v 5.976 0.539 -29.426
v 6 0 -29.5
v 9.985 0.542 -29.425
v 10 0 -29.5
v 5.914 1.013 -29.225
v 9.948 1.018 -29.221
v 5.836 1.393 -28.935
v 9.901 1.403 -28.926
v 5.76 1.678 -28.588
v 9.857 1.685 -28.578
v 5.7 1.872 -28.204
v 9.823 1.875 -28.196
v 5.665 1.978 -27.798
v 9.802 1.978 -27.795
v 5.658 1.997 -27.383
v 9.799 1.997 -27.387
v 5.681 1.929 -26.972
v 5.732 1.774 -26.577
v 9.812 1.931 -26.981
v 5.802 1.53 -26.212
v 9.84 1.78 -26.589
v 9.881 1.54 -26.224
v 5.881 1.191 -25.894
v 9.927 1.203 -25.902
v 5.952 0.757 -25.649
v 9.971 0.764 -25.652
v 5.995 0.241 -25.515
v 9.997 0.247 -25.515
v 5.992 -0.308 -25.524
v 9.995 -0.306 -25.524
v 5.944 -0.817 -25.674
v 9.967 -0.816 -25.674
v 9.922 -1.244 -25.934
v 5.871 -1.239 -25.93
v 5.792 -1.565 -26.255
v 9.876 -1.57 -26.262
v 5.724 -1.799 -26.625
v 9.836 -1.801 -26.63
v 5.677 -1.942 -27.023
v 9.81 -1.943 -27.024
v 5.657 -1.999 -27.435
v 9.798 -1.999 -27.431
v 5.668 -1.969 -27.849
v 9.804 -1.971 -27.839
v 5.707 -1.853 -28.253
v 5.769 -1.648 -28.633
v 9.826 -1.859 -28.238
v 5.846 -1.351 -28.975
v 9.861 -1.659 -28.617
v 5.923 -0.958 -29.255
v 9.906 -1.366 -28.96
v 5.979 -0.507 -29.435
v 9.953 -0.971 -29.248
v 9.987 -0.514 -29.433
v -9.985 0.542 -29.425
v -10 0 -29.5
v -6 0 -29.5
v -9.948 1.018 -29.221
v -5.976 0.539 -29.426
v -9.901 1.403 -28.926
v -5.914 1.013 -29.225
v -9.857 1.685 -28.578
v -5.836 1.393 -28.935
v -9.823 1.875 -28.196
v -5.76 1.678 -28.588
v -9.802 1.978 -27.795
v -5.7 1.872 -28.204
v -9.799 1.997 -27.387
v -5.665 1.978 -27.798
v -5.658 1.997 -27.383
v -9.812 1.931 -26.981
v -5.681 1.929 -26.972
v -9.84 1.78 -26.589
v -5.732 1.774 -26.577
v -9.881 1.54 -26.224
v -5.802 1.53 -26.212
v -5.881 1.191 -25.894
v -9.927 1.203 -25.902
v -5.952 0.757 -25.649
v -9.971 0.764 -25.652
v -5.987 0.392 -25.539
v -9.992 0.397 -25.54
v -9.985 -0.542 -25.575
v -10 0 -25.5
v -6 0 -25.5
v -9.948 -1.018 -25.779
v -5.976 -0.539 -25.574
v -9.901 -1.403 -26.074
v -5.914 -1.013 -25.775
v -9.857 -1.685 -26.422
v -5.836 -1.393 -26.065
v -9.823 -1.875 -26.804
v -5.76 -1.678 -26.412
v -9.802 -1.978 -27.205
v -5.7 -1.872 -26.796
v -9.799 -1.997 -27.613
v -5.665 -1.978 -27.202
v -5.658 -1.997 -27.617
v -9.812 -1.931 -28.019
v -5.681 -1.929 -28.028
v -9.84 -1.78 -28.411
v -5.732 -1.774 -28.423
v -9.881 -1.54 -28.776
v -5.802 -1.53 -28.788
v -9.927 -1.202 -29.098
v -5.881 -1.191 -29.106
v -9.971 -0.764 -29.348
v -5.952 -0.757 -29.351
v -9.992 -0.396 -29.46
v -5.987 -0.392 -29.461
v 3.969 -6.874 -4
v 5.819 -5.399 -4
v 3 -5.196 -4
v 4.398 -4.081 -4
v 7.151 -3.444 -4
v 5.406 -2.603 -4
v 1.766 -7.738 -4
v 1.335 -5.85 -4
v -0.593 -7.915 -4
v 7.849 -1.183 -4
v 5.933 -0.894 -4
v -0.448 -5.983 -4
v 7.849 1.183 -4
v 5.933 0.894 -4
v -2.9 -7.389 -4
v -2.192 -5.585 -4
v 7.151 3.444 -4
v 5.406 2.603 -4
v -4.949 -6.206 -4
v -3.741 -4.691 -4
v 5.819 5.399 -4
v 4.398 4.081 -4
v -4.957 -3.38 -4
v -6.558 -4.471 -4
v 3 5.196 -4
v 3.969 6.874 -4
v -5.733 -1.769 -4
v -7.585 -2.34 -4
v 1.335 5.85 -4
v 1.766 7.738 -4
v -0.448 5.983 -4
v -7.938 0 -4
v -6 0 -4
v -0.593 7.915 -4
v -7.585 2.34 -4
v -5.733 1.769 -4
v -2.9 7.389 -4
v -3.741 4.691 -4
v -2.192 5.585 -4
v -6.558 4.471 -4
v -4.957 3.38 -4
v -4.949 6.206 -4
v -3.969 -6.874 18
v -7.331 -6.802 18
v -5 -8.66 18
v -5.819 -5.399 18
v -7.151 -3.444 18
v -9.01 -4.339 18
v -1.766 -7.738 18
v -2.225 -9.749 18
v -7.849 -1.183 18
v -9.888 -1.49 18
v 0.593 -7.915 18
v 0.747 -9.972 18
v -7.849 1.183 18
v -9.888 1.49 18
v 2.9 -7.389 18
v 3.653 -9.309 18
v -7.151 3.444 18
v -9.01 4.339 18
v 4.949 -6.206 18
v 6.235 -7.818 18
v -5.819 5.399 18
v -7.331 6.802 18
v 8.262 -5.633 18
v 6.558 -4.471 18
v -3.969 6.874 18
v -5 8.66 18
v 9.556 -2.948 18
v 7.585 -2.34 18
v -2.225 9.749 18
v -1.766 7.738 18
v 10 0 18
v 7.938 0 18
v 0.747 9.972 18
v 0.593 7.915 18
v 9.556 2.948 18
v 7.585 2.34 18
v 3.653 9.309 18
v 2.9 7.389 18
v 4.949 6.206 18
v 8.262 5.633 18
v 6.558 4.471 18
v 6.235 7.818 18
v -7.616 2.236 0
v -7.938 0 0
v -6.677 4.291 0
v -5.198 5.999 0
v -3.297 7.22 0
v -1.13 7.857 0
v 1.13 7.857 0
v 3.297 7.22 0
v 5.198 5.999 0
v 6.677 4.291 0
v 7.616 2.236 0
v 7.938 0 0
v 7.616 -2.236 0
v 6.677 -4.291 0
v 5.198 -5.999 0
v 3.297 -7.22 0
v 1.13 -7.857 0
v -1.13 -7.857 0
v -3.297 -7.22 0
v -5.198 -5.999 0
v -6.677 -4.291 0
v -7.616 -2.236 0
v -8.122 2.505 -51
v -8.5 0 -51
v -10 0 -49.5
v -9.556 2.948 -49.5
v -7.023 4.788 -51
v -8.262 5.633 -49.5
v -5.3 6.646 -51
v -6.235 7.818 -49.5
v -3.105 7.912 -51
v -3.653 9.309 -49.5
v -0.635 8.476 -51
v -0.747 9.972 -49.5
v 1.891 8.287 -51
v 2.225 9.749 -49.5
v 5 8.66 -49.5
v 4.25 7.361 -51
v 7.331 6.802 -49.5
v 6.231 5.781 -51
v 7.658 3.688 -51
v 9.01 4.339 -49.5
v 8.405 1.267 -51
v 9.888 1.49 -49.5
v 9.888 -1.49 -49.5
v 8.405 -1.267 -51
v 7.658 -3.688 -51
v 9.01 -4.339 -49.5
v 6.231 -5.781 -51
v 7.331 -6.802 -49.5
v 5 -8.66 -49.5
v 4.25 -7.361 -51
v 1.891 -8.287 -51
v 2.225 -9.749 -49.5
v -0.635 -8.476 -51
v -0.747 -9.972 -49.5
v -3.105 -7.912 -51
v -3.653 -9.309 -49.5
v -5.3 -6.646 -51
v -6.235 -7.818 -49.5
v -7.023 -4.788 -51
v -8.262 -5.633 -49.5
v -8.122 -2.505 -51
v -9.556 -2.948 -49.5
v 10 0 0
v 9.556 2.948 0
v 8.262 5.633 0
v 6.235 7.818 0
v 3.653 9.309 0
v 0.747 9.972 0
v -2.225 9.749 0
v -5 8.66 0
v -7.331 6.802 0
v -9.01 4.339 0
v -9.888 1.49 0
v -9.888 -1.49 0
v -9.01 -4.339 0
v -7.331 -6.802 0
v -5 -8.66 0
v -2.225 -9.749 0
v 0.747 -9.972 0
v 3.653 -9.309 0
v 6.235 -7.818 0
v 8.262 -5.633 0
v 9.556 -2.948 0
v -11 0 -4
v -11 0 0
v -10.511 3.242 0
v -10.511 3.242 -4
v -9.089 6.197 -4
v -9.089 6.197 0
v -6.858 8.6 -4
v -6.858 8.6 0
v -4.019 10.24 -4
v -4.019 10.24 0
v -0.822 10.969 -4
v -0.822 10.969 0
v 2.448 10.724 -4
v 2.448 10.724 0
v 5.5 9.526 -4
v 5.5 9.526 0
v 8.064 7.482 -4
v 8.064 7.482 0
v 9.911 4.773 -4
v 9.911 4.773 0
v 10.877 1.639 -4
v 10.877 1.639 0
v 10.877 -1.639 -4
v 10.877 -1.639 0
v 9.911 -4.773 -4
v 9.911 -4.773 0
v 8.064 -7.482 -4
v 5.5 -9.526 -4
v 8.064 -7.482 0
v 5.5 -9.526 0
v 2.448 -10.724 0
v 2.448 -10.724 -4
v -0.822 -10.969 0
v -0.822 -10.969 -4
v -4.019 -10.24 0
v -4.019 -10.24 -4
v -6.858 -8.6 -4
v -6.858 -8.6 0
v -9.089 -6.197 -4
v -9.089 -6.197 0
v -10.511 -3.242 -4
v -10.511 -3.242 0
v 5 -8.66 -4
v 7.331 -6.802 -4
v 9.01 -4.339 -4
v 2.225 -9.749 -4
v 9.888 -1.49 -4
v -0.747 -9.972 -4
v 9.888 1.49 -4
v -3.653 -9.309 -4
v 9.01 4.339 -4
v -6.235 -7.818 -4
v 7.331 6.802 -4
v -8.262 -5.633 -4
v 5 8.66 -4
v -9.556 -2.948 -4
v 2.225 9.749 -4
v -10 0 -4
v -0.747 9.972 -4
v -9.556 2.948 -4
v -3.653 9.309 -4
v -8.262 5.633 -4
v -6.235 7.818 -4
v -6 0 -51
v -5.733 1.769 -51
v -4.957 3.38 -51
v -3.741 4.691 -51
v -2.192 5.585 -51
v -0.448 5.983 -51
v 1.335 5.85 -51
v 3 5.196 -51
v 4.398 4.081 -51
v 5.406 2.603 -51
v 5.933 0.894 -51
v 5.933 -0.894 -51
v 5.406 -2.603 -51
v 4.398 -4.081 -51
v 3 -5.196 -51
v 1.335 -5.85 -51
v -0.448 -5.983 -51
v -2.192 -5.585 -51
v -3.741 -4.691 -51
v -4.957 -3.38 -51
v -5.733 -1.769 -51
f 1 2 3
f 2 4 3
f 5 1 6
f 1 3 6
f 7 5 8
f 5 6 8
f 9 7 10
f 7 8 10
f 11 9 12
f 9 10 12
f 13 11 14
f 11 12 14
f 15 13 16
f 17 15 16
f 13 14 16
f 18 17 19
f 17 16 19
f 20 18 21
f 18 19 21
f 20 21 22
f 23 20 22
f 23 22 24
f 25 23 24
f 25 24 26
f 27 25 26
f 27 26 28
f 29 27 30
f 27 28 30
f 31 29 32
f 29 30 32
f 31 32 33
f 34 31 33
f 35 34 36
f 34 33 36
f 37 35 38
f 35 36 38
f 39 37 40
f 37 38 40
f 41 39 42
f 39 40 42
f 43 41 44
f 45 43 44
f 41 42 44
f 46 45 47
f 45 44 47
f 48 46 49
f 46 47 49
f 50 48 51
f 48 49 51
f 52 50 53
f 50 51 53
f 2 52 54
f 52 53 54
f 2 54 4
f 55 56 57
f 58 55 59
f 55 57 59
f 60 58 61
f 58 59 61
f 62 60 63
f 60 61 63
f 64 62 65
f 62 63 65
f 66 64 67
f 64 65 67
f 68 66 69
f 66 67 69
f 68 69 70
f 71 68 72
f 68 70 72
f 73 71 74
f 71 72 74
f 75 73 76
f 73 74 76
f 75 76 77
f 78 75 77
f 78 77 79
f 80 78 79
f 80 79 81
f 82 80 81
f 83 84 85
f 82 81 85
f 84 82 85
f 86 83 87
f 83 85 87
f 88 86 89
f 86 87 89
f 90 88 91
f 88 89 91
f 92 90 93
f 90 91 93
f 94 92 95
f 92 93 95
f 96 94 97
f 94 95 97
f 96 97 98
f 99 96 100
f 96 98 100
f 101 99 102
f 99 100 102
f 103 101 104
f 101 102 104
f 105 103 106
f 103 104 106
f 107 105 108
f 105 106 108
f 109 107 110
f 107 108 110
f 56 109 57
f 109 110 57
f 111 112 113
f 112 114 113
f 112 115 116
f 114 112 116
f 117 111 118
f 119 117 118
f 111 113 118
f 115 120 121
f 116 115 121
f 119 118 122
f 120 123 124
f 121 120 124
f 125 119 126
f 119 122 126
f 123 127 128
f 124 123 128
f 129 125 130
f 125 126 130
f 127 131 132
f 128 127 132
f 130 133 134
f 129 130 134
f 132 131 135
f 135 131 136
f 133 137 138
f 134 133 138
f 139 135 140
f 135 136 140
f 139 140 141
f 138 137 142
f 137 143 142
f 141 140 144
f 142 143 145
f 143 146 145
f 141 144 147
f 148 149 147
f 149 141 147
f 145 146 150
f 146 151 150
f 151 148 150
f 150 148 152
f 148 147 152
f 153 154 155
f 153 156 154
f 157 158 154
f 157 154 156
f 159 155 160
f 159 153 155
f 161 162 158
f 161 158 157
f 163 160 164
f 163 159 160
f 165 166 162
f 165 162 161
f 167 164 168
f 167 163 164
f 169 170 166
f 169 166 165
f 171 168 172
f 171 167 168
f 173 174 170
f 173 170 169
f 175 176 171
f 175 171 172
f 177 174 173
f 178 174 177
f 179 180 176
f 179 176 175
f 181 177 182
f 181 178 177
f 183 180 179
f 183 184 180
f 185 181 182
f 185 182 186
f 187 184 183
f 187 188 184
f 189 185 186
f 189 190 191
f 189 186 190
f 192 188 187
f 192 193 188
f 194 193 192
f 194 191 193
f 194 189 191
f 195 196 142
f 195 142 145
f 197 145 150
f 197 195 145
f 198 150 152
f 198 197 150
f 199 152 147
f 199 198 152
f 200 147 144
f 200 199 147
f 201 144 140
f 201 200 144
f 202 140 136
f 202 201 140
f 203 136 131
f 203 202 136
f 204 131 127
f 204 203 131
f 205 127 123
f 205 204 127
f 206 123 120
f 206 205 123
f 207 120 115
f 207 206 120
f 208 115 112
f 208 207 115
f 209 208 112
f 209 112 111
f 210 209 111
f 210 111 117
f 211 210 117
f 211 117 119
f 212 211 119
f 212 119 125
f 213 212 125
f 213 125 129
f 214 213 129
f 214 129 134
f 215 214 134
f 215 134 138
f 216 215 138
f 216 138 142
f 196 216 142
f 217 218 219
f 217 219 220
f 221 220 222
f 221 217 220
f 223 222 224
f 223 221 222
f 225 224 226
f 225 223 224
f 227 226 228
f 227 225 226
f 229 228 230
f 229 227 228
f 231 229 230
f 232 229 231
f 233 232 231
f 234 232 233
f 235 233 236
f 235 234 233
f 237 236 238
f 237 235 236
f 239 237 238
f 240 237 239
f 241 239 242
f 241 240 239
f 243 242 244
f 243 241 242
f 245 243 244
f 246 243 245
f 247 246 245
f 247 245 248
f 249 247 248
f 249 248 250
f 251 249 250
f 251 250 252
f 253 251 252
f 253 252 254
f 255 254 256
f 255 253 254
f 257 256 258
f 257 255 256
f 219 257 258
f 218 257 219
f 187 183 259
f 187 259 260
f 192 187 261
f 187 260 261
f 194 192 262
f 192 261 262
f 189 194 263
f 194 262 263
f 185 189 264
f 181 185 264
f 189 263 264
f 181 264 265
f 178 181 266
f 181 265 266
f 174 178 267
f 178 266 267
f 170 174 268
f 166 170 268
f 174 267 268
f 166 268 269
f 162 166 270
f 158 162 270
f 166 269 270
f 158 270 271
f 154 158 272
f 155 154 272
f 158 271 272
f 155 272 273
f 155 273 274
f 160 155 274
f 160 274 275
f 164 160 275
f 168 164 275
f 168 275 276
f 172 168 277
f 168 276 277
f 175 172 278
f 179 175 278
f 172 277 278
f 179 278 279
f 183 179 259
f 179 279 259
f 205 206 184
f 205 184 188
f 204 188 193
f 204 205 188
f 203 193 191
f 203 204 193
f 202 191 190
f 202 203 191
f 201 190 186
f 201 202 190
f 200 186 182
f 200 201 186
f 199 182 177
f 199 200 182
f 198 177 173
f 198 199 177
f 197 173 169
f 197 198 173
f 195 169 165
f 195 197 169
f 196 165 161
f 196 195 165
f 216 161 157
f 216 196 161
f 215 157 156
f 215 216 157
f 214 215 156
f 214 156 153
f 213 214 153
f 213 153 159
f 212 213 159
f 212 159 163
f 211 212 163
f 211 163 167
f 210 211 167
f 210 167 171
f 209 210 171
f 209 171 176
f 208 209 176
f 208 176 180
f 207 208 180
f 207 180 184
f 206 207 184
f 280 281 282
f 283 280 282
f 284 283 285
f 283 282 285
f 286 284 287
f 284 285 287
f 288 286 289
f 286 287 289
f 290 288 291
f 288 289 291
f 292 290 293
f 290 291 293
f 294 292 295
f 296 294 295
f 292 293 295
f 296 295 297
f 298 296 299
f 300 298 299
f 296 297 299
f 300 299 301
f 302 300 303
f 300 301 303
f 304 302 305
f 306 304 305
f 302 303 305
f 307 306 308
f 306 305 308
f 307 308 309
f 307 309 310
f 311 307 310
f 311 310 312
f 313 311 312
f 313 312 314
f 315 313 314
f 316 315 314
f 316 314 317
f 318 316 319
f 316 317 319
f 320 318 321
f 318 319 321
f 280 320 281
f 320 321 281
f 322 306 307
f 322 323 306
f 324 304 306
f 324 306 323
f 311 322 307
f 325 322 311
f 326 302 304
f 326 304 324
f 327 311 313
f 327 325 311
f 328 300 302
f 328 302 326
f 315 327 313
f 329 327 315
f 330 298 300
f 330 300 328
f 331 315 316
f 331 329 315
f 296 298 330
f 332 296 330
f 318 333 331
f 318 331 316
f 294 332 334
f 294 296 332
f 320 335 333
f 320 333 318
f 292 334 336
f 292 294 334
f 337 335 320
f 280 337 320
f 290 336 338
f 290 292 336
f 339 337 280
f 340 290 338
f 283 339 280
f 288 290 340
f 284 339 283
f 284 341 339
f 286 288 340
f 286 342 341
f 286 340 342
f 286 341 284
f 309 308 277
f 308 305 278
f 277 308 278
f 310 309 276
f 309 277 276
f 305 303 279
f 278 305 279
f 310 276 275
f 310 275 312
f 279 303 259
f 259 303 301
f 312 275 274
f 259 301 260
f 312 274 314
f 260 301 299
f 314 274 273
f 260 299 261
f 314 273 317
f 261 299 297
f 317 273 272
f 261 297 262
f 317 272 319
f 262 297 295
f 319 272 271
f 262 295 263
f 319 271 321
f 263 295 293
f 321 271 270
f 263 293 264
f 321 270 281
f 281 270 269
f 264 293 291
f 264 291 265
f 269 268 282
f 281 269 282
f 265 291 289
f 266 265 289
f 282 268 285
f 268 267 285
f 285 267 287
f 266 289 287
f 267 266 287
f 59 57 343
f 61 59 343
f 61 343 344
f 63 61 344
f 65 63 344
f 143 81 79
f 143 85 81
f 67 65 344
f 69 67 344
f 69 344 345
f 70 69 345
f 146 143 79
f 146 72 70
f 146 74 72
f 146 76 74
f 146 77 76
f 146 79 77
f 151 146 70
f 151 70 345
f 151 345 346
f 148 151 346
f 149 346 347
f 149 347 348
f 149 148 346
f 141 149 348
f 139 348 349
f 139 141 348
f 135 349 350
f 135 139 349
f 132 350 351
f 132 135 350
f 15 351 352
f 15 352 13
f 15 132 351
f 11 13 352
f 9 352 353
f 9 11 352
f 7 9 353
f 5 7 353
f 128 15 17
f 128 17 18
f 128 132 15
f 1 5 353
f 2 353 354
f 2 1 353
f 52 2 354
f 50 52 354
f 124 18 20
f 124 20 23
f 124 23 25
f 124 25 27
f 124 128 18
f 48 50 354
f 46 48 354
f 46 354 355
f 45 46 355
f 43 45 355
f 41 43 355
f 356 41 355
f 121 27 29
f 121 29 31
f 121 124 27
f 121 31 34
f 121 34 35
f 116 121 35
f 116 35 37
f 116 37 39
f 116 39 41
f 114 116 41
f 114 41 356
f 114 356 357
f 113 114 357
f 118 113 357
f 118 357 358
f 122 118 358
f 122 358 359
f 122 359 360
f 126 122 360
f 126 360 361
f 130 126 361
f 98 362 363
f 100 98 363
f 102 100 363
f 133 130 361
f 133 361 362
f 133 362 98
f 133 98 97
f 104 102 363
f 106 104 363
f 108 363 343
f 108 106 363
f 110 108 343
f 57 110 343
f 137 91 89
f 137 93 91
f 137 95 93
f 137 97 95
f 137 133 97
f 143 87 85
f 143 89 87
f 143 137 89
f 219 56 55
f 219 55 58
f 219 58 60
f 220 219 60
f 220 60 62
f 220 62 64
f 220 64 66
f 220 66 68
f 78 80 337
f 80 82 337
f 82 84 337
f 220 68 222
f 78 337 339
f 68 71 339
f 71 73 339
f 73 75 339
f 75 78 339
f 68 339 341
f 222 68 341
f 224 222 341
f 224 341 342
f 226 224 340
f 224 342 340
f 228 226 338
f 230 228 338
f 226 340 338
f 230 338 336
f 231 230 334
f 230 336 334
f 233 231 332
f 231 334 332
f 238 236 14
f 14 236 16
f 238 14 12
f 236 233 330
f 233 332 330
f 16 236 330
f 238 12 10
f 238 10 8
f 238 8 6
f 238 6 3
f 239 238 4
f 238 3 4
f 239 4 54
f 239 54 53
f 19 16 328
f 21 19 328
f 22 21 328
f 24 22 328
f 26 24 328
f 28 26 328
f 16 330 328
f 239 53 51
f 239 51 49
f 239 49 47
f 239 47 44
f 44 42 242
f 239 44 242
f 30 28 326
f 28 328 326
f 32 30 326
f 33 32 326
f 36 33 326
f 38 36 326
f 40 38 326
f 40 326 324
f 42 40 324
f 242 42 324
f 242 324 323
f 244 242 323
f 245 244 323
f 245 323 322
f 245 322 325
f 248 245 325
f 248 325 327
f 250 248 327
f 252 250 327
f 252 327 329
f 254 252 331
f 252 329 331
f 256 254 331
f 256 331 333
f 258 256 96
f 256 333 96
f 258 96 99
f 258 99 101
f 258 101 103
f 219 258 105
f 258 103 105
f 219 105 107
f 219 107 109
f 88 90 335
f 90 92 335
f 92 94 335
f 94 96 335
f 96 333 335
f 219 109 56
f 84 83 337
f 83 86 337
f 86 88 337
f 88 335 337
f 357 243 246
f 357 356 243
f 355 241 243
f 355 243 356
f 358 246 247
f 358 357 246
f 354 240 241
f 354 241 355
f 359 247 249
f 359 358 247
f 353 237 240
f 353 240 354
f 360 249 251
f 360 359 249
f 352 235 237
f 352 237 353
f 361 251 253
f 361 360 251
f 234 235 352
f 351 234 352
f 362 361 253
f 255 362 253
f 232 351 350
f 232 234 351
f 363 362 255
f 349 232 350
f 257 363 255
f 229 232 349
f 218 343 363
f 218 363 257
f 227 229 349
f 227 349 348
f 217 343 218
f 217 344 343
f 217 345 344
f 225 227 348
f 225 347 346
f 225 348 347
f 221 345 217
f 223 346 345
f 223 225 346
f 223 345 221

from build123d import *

# Parameters (mm, degrees)
SZKIC1_R                    = 10
SZKIC1_R_2                  = 7.9375
DODANIE_WYCI_GNI_CIE1_DEPTH = 18
SZKIC2_R                    = 11
SZKIC2_R_2                  = 7.9375
DODANIE_WYCI_GNI_CIE2_DEPTH = 4
SZKIC3_R                    = 10
SZKIC3_R_2                  = 6
DODANIE_WYCI_GNI_CIE3_DEPTH = 47
SFAZOWANIE1_SIZE            = 1.5
SZKIC6_R                    = 2
WYTNIJ_WYCI_GNI_CIE1_DEPTH  = 15


with BuildPart() as part:
    # Szkic1 → Dodanie-wyciągnięcie1 (new body)
    with BuildSketch(Plane.XY):
        Circle(SZKIC1_R)
        Circle(SZKIC1_R_2, mode=Mode.SUBTRACT)
    extrude(amount=DODANIE_WYCI_GNI_CIE1_DEPTH)

    # Szkic2 → Dodanie-wyciągnięcie2 (add)
    with BuildSketch(Plane(origin=(0, 0, 0), x_dir=(-1, 0, 0), z_dir=(0, 0, -1))):
        Circle(SZKIC2_R)
        Circle(SZKIC2_R_2, mode=Mode.SUBTRACT)
    extrude(amount=DODANIE_WYCI_GNI_CIE2_DEPTH)

    # Szkic3 → Dodanie-wyciągnięcie3 (add)
    with BuildSketch(Plane(origin=(0, 0, -4), x_dir=(-1, 0, 0), z_dir=(0, 0, -1))):
        Circle(SZKIC3_R)
        Circle(SZKIC3_R_2, mode=Mode.SUBTRACT)
    extrude(amount=DODANIE_WYCI_GNI_CIE3_DEPTH)

    # Sfazowanie1
    sfazowanie1_edges = [part.edges().sort_by_distance(p)[0] for p in [
        (10, 0, -51),
    ]]
    chamfer(sfazowanie1_edges, length=SFAZOWANIE1_SIZE)

    # Szkic6 → Wytnij-wyciągnięcie1 (cut, symmetric)
    with BuildSketch(Plane(origin=(0, 0, 0), x_dir=(0, 0, -1), z_dir=(1, 0, 0))):
        with Locations((27.5, 0)):
            Circle(SZKIC6_R)
    extrude(amount=WYTNIJ_WYCI_GNI_CIE1_DEPTH, both=True, mode=Mode.SUBTRACT)


solid = part.part
